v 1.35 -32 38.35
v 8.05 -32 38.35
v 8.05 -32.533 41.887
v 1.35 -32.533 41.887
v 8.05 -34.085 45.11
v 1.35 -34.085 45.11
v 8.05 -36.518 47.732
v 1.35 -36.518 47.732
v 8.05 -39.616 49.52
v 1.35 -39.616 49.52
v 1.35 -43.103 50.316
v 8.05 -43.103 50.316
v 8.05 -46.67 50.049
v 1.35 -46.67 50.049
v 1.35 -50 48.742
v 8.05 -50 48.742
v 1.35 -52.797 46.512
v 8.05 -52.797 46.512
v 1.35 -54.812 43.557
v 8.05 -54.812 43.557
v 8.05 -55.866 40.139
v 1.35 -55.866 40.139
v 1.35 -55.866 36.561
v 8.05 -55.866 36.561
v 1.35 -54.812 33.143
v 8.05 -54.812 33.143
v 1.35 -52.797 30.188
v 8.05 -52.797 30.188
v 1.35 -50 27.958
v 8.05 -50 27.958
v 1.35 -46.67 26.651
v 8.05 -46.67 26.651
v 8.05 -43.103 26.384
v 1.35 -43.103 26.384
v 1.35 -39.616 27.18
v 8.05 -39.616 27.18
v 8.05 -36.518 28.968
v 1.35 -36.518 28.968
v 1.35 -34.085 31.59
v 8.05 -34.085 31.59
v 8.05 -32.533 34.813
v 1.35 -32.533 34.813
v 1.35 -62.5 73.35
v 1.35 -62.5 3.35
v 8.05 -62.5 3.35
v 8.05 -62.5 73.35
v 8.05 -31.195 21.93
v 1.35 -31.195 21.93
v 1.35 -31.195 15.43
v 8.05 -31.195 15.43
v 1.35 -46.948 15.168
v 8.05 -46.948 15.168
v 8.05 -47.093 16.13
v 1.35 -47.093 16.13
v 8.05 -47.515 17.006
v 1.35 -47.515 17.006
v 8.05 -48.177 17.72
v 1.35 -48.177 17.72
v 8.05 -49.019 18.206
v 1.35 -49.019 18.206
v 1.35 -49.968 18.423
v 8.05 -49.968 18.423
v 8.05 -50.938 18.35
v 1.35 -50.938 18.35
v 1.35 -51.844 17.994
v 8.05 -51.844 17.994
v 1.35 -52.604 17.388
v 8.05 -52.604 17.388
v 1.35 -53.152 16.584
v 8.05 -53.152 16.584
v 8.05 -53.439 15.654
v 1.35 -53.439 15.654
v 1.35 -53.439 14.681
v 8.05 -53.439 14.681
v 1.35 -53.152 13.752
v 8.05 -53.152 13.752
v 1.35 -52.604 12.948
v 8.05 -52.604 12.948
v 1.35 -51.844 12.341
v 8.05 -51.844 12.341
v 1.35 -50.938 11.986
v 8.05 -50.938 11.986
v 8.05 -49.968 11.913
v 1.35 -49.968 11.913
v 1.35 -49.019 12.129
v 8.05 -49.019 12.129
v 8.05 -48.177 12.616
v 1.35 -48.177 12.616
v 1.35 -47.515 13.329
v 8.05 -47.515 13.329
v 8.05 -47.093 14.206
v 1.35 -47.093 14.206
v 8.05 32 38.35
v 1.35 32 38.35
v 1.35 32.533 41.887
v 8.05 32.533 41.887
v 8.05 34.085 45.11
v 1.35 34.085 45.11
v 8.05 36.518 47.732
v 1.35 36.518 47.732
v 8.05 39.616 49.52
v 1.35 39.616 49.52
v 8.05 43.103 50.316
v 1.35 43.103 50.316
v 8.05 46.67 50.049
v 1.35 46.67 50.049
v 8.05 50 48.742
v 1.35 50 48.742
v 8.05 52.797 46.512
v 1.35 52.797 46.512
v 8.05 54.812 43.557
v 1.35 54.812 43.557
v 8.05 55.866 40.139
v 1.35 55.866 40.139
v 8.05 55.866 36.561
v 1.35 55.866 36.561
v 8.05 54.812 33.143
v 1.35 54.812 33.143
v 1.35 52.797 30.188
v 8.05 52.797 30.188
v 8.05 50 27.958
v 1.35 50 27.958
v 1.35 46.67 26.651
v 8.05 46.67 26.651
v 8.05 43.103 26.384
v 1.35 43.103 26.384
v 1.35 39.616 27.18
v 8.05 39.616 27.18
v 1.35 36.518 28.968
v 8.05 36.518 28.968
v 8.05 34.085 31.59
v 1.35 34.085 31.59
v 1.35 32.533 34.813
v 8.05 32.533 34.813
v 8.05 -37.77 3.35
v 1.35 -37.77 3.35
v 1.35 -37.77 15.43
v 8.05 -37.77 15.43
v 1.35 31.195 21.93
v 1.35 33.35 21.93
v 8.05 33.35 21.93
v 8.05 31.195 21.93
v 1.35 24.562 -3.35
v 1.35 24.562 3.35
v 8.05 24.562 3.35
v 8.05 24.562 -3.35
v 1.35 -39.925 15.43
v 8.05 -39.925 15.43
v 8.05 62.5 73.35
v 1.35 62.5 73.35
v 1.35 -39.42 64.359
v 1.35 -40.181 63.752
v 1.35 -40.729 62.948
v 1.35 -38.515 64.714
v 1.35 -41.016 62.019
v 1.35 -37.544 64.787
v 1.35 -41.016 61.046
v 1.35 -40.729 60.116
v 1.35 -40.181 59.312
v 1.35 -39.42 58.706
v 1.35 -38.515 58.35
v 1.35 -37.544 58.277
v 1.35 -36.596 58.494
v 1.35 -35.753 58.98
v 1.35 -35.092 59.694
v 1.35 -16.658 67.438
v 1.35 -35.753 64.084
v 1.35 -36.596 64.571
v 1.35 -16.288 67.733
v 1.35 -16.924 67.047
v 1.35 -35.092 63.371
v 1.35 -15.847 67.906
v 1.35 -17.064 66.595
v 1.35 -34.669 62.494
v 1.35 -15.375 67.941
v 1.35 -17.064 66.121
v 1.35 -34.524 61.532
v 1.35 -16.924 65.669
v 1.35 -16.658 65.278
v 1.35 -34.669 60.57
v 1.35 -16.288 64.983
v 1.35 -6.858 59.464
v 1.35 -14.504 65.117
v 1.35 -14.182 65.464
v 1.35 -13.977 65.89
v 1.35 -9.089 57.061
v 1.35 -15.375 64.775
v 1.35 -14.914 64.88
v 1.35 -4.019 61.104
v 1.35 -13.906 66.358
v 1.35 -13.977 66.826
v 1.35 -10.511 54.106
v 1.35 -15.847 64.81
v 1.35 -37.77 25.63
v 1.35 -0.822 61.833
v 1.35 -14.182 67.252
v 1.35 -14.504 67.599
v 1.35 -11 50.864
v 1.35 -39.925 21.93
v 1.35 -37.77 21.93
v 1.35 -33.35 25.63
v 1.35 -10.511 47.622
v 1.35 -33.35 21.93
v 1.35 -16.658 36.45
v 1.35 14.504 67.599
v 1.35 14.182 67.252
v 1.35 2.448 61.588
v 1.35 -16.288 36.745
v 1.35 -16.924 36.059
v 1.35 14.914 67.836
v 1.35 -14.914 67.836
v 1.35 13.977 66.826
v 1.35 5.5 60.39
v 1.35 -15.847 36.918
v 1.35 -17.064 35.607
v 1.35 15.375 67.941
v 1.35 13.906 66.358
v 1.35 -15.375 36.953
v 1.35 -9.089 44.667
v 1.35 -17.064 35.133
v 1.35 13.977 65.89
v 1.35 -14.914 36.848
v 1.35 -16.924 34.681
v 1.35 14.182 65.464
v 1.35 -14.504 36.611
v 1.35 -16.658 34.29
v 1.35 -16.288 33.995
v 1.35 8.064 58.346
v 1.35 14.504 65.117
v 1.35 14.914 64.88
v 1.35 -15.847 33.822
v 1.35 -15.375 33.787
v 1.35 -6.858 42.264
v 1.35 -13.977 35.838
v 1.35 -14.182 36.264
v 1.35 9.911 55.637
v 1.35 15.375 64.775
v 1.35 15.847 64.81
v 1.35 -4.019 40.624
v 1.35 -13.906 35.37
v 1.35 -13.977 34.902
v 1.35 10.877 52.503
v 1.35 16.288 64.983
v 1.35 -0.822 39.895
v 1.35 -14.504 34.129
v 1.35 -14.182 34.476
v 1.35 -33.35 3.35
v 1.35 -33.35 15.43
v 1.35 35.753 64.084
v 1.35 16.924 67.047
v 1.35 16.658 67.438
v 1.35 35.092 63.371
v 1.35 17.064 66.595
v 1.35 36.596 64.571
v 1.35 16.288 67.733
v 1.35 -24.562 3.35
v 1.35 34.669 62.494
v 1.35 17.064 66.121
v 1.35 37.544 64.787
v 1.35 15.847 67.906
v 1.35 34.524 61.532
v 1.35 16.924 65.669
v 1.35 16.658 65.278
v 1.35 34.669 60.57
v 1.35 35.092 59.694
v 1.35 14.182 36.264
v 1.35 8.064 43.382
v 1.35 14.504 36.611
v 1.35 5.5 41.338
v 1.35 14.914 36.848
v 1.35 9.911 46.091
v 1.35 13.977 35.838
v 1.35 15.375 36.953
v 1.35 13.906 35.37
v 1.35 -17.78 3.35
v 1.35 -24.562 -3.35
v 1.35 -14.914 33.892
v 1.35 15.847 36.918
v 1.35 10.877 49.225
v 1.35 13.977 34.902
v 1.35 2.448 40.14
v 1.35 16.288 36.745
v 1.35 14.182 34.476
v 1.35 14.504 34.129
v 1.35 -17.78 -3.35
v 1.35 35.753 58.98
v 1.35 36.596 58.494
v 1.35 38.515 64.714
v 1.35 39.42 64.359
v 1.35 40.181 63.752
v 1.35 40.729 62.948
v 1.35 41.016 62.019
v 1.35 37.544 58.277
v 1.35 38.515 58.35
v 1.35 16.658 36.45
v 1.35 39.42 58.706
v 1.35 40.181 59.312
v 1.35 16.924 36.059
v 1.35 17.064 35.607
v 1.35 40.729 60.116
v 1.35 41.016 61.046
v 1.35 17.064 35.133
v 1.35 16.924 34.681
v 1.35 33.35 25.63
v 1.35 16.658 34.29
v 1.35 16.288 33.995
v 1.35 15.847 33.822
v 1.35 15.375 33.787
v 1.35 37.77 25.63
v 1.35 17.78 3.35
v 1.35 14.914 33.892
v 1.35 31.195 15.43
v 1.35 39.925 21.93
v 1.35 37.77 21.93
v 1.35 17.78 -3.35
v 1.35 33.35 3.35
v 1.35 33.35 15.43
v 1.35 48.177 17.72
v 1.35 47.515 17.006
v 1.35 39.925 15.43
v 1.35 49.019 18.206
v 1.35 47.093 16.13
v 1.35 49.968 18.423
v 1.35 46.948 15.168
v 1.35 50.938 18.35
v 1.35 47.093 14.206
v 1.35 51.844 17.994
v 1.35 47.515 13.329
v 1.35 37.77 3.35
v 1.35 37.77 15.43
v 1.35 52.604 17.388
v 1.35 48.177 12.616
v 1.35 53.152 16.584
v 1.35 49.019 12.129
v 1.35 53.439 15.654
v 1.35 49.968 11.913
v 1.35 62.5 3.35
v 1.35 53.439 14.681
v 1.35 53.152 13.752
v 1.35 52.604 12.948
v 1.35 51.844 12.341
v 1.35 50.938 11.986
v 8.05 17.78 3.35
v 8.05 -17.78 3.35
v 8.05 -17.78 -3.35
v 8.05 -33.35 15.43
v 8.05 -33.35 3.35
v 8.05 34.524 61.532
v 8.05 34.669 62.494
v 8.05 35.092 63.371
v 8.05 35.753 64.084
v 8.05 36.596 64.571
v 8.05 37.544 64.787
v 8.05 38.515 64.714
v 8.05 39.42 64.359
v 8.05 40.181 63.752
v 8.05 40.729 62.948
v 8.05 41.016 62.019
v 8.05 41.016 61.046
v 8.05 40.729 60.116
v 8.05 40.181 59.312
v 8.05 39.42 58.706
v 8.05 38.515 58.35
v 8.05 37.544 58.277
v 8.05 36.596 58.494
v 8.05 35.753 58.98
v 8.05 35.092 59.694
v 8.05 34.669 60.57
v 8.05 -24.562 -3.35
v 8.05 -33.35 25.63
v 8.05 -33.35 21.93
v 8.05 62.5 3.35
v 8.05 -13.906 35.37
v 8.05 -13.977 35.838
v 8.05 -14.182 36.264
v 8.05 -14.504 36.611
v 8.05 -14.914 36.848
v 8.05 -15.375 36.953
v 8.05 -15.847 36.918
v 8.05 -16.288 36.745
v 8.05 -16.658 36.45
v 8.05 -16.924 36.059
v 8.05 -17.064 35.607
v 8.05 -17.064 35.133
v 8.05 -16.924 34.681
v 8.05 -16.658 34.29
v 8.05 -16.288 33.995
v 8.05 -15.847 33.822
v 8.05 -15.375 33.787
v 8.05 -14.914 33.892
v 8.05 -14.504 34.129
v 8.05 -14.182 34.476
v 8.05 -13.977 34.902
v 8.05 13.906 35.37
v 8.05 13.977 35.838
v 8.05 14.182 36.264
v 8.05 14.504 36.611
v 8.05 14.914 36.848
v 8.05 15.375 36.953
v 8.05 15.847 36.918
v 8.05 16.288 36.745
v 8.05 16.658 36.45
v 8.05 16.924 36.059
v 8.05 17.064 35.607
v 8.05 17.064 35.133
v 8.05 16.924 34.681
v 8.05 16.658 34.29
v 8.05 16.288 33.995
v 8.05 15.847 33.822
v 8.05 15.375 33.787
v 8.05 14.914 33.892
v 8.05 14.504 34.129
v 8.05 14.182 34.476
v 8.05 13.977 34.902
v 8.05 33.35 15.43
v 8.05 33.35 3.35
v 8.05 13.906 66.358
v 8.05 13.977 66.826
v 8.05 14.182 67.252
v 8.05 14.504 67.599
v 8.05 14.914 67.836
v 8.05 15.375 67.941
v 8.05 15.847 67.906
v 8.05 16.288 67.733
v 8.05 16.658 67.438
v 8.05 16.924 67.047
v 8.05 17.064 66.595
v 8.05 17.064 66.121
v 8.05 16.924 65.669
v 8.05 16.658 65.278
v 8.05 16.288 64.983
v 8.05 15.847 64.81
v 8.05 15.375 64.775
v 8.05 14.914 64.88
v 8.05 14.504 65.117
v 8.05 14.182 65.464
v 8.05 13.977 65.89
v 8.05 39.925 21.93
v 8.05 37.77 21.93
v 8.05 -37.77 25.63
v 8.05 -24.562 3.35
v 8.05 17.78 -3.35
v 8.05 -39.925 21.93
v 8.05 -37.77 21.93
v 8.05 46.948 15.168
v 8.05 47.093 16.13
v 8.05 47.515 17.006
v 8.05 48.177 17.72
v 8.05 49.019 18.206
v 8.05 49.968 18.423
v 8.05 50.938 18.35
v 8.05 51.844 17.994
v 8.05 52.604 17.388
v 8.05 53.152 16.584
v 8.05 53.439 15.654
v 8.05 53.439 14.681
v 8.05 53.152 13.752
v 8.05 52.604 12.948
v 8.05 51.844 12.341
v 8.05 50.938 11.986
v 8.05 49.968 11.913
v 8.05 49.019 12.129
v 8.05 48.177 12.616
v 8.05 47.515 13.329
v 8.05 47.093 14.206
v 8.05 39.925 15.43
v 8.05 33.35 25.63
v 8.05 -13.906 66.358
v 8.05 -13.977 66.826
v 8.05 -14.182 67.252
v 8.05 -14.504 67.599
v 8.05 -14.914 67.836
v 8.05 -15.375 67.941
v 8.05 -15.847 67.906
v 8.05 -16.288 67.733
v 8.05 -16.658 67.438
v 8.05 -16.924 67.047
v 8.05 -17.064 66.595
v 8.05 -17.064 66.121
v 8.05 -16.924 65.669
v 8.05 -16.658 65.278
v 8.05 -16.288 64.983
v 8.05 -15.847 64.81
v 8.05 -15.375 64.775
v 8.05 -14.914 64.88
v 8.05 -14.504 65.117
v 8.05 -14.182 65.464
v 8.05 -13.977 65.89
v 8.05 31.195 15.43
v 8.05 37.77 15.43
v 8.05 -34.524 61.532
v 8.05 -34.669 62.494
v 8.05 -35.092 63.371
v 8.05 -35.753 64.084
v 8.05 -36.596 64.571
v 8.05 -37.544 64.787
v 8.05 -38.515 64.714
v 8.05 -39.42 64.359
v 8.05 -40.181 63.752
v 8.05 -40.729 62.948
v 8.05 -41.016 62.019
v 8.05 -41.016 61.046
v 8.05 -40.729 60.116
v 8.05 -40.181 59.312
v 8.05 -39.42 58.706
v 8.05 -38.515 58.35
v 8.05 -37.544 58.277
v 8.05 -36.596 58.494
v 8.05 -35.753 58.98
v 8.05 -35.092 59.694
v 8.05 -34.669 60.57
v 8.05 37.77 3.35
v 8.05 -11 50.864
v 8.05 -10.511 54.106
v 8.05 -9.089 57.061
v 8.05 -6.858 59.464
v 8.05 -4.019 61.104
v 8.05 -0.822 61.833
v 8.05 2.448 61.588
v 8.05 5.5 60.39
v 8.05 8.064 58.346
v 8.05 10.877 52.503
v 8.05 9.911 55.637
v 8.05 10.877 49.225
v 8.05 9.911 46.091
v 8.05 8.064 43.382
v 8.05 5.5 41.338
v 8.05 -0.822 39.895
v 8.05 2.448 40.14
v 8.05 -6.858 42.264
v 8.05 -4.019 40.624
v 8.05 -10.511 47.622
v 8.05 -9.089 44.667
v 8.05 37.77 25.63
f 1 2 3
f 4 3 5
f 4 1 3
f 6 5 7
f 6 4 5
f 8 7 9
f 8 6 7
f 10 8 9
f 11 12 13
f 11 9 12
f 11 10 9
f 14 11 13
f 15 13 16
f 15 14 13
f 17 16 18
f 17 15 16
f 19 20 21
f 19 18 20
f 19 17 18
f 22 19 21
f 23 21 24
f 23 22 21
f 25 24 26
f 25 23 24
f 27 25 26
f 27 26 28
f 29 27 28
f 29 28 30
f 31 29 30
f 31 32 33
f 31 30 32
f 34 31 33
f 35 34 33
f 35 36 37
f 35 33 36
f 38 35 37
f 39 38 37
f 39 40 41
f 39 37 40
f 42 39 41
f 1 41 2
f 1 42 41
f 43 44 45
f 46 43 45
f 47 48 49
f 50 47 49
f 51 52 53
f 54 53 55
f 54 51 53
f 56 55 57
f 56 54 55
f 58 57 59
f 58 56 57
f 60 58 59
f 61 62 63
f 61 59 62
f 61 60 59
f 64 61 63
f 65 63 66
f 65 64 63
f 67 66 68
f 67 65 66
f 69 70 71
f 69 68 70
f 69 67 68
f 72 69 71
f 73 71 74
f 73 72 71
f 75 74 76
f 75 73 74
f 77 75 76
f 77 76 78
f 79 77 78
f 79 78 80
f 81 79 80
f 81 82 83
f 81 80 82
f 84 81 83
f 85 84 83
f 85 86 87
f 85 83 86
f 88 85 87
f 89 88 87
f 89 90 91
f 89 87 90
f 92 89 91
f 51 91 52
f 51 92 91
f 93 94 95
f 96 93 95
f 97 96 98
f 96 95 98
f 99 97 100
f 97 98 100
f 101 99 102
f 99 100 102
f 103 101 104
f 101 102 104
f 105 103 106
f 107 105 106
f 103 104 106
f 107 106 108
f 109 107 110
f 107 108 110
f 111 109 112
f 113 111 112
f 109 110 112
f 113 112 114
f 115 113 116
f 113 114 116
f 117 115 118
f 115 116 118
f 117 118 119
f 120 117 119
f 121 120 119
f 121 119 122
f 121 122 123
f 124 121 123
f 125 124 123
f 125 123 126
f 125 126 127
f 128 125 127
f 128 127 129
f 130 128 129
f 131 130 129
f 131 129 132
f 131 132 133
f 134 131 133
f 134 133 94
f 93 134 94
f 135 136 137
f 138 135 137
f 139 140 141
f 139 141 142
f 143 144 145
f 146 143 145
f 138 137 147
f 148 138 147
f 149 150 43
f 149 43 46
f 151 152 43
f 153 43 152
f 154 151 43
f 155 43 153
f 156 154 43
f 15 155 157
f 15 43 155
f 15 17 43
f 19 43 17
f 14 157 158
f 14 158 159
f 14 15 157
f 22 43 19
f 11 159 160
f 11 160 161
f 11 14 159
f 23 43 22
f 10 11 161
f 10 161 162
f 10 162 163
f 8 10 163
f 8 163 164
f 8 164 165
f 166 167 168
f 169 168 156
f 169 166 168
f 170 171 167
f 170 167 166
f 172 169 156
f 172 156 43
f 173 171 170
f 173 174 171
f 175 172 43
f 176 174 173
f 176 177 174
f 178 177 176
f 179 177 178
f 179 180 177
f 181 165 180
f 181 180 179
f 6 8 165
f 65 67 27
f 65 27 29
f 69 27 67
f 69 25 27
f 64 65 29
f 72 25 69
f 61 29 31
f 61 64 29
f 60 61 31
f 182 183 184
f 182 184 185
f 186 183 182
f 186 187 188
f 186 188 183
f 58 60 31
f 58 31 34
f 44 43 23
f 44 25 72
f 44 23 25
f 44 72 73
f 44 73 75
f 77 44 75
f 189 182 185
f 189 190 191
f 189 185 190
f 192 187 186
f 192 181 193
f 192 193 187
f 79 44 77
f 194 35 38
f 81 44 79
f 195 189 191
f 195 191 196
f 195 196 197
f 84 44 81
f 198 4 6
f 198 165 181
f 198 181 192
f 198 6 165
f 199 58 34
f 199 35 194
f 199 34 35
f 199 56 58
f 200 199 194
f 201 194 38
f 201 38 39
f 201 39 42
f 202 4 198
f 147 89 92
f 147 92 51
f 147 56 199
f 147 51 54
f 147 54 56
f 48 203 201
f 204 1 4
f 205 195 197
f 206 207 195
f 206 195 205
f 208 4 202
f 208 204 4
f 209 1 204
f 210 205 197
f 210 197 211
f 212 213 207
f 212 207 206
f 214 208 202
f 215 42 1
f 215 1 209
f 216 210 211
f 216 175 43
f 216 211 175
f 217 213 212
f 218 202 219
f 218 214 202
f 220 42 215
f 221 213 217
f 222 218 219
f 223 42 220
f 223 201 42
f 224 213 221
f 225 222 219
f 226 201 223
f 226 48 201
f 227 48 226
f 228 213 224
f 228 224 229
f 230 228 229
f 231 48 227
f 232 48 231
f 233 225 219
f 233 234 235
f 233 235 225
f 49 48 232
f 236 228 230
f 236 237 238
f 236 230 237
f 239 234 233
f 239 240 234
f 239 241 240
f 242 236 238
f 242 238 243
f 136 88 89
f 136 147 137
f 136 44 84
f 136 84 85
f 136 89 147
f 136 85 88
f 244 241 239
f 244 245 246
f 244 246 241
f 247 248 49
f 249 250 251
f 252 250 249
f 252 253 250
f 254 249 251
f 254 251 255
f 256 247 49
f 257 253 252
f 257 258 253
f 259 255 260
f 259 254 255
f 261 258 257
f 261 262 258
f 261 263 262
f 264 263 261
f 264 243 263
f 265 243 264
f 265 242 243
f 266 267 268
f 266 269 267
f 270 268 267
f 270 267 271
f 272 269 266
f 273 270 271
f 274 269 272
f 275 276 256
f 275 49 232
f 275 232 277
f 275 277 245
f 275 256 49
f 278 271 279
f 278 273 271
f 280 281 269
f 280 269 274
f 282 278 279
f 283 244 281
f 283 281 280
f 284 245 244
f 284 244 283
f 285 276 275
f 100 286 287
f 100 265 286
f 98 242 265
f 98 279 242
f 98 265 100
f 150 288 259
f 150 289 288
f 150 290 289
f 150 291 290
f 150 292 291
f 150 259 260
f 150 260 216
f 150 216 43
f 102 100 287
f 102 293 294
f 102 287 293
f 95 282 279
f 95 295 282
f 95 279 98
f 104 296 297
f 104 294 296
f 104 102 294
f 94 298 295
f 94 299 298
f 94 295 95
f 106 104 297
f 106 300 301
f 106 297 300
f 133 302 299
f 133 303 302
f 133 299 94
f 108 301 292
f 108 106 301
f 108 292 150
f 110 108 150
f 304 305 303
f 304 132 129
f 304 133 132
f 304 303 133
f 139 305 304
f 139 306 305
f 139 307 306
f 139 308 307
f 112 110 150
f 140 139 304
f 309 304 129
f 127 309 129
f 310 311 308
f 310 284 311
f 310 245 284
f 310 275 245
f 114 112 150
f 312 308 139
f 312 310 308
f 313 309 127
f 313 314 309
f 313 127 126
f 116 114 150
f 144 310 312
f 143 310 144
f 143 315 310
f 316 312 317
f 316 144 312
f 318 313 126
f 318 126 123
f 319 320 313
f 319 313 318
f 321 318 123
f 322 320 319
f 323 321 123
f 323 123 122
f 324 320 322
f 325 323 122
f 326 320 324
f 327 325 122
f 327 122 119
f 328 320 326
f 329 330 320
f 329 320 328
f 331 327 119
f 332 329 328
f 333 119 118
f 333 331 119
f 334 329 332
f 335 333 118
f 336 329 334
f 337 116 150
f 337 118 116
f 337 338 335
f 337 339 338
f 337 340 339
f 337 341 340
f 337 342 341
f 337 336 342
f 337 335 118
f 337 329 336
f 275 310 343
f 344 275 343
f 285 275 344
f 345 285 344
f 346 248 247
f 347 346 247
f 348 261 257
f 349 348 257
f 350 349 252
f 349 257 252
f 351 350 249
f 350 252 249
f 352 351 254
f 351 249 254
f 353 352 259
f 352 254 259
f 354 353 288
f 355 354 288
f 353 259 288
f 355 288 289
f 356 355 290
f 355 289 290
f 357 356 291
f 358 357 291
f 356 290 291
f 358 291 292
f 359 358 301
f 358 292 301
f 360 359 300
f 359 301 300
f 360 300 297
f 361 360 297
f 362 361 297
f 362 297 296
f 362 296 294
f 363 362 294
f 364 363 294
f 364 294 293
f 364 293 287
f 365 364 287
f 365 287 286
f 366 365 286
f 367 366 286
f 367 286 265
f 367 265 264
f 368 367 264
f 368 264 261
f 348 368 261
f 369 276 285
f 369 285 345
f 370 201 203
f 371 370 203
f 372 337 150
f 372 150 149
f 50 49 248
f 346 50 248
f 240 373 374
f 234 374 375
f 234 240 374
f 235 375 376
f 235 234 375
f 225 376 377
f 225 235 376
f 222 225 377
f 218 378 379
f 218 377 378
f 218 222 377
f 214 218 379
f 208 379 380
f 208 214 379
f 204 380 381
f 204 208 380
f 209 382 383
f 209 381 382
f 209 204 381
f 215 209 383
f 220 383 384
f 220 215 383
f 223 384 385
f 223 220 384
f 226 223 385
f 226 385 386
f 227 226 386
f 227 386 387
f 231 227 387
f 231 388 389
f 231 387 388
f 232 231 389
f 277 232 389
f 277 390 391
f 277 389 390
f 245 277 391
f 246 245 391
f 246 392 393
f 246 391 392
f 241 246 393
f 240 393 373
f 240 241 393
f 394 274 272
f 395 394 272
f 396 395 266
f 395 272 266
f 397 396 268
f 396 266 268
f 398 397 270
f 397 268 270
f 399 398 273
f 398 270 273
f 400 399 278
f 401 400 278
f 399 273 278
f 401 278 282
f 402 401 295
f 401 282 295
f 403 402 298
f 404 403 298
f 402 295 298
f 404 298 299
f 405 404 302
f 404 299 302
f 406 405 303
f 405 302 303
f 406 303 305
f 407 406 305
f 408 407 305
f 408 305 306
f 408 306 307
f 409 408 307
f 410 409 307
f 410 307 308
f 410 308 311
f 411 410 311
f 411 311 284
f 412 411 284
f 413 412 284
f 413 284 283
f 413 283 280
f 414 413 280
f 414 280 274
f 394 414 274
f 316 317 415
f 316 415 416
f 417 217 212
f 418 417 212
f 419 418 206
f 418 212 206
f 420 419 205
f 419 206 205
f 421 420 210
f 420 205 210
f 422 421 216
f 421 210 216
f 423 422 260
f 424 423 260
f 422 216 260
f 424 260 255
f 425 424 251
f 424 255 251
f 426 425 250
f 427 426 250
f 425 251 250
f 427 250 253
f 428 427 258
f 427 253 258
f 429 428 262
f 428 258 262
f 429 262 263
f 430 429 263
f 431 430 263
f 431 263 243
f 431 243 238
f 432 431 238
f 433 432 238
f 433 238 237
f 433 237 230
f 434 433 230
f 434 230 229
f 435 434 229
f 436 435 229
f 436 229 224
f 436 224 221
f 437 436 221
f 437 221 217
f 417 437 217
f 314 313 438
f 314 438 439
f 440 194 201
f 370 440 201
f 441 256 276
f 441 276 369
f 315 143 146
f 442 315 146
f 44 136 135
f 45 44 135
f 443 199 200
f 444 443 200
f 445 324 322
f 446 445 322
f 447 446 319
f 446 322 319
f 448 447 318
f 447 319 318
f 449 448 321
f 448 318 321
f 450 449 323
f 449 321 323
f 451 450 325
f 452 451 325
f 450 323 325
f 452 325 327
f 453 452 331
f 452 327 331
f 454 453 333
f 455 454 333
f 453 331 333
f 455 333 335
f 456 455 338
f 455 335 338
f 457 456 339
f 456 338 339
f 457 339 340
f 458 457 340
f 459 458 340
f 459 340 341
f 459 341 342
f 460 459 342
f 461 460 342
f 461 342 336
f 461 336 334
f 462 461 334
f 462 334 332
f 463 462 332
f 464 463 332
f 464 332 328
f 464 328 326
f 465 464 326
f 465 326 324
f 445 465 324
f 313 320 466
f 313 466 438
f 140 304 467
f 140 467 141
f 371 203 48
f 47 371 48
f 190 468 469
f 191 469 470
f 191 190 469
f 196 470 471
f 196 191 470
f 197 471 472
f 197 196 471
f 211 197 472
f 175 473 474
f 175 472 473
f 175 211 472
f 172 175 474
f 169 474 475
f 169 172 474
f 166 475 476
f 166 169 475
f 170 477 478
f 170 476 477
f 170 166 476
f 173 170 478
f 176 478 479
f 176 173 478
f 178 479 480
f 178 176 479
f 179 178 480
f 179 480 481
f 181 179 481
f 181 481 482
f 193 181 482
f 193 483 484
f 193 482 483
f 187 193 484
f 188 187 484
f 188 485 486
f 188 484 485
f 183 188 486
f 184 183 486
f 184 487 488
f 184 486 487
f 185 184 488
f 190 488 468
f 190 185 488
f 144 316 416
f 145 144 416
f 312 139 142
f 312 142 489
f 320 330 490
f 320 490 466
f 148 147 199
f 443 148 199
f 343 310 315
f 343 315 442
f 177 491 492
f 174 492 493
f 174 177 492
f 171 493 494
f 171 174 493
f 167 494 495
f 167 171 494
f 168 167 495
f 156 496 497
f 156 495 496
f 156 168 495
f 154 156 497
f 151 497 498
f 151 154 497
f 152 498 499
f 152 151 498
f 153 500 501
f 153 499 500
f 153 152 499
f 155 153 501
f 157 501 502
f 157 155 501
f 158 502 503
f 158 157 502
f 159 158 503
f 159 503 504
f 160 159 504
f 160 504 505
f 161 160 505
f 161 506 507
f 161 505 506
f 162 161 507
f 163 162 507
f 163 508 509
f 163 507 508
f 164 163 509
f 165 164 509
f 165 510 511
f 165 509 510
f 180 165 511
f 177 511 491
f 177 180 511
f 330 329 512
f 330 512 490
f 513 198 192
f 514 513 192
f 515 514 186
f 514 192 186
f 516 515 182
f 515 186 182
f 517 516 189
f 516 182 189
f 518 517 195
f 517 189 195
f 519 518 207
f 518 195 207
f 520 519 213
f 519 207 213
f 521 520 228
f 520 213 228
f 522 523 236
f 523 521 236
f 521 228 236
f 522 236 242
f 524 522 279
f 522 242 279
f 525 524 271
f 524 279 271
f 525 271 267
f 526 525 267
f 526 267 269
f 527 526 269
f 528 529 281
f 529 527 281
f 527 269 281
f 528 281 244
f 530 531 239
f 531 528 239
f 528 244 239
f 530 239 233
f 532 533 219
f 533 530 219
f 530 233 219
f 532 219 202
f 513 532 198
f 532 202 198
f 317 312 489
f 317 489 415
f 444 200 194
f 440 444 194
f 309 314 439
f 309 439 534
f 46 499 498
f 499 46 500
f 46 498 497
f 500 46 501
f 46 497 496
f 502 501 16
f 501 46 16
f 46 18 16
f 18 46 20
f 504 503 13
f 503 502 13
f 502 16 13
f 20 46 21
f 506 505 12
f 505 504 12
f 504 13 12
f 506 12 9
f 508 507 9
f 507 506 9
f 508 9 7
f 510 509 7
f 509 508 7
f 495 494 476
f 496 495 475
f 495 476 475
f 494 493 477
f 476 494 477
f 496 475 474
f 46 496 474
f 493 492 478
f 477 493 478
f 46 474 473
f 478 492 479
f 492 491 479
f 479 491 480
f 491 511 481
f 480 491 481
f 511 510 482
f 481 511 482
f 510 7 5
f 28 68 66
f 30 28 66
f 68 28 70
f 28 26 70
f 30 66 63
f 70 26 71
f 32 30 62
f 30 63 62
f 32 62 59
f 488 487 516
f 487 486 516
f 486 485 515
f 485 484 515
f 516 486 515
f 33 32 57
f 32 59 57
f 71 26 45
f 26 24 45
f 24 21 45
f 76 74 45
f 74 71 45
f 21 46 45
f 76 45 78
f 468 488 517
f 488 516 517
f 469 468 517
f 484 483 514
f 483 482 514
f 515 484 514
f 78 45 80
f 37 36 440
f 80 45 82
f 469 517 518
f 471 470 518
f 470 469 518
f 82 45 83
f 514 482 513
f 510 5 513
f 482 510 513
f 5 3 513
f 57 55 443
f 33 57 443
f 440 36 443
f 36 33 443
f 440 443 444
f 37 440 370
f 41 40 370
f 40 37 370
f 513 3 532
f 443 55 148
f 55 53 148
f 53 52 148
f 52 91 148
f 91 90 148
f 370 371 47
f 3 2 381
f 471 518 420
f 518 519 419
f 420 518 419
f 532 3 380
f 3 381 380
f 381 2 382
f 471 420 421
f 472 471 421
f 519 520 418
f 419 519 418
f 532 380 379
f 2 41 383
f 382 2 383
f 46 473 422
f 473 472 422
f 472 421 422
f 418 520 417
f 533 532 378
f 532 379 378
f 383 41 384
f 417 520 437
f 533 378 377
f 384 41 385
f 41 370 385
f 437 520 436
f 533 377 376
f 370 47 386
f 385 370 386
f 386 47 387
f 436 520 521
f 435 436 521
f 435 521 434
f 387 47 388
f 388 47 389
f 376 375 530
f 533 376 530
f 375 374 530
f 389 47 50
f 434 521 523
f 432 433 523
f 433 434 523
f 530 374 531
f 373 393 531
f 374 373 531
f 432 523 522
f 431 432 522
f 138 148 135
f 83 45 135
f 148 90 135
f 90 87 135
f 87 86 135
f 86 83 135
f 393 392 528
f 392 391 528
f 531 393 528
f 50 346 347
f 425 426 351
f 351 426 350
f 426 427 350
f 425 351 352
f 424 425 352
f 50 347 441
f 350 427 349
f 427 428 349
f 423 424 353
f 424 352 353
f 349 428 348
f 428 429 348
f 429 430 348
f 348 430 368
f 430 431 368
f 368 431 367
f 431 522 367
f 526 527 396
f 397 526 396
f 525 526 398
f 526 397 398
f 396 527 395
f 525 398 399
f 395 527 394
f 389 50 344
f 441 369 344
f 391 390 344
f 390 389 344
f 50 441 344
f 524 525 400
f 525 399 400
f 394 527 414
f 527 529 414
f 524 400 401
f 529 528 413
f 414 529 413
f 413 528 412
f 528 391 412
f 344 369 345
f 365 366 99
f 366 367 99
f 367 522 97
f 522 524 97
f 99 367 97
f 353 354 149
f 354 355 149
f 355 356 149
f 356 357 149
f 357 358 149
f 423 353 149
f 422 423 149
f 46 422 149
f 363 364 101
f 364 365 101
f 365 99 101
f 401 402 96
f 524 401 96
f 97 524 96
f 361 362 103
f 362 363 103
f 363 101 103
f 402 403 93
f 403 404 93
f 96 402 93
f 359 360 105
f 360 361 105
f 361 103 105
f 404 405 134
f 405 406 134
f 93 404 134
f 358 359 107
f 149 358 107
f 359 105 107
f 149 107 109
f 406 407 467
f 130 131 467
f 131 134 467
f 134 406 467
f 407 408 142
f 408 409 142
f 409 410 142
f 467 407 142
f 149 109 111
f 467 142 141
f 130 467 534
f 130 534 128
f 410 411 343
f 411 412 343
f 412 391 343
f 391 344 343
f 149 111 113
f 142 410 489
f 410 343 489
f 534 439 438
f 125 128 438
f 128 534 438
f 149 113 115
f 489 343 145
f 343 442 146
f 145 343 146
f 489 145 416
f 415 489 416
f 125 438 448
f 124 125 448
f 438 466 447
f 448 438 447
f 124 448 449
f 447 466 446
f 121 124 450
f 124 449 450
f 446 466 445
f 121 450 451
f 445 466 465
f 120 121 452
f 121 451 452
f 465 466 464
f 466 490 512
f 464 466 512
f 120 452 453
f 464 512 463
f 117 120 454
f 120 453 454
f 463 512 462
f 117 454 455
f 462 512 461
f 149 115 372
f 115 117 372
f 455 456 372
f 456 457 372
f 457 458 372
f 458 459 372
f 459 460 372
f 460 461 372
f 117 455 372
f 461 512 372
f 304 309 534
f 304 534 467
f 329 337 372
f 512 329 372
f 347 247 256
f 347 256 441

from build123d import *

# Parameters (mm, degrees)
SKETCH001_W                      = 6.7
SKETCH001_H                      = 125
PAD004_DEPTH                     = 70
SKETCH001002002010004010_R       = 12
SKETCH001002002010004010_R_2     = 11
SKETCH001002002010004010_R_3     = 3.264
SKETCH001002002010004010_R_4     = 1.5875
POCKET008_DEPTH                  = 293.545139
POCKET009_DEPTH                  = 293.545139
SKETCH001002002010004011001005_W = 6.7
SKETCH001002002010004011001005_H = 6.7818
PAD005_DEPTH                     = 6.7


with BuildPart() as part:
    # Sketch001 → Pad004 (new body)
    with BuildSketch(Plane.XY.offset(3.35)):
        with Locations((4.7, 0)):
            Rectangle(SKETCH001_W, SKETCH001_H)
    extrude(amount=PAD004_DEPTH)

    # Sketch001002002010004010 → Pocket008 (cut, through all)
    with BuildSketch(Plane(origin=(1.35, 0, 3.35), x_dir=(0, -1, 0), z_dir=(-1, 0, 0))):
        with Locations((-44, 35)):
            Circle(SKETCH001002002010004010_R)
        with Locations((0, 47.514)):
            Circle(SKETCH001002002010004010_R_2)
        with Locations((-37.788344, 58.18222)):
            Circle(SKETCH001002002010004010_R_3)
        with Locations((-50.211656, 11.81778)):
            Circle(SKETCH001002002010004010_R_3)
        with Locations((-15.494, 63.008)):
            Circle(SKETCH001002002010004010_R_4)
        with Locations((-15.494, 32.02)):
            Circle(SKETCH001002002010004010_R_4)
    pocket008 = extrude(amount=-POCKET008_DEPTH, mode=Mode.SUBTRACT)

    # Mirrored: Pocket008 across Sketch001002002010004010 V_Axis
    add(pocket008.mirror(Plane(origin=(1.35, 0, 3.35), x_dir=(-1, 0, 0), z_dir=(0, -1, 0))), mode=Mode.SUBTRACT)

    # Sketch001002002010004011001004 → Pocket009 (cut, through all)
    with BuildSketch(Plane(origin=(1.35, 0, 3.35), x_dir=(0, -1, 0), z_dir=(-1, 0, 0))):
        Polygon((-37.77, -1e-06), (-37.770004, 12.079999), (-39.925004, 12.079998), (-39.925006, 18.579998), (-37.770006, 18.579999), (-37.770007, 22.279999), (-33.350007, 22.28), (-33.350006, 18.58), (-31.195006, 18.580001), (-31.195004, 12.080001), (-33.350004, 12.08), (-33.35, 0), (-35.56, -1e-06), align=None)
    pocket009 = extrude(amount=-POCKET009_DEPTH, mode=Mode.SUBTRACT)

    # Mirrored001: Pocket009 across Sketch001002002010004011001004 V_Axis
    add(pocket009.mirror(Plane(origin=(1.35, 0, 3.35), x_dir=(-1, 0, 0), z_dir=(0, -1, 0))), mode=Mode.SUBTRACT)

    # Sketch001002002010004011001005 → Pad005 (new body)
    with BuildSketch(Plane(origin=(0, 0, 3.35), x_dir=(1, 0, 0), z_dir=(0, 0, -1))):
        with Locations((4.7, 21.1709)):
            Rectangle(SKETCH001002002010004011001005_W, SKETCH001002002010004011001005_H)
    pad005 = extrude(amount=PAD005_DEPTH)

    # Mirrored002: Pad005 across Sketch001002002010004011001005 H_Axis
    add(pad005.mirror(Plane(origin=(0, 0, 3.35), x_dir=(0, 0, -1), z_dir=(0, -1, 0))))


solid = part.part
